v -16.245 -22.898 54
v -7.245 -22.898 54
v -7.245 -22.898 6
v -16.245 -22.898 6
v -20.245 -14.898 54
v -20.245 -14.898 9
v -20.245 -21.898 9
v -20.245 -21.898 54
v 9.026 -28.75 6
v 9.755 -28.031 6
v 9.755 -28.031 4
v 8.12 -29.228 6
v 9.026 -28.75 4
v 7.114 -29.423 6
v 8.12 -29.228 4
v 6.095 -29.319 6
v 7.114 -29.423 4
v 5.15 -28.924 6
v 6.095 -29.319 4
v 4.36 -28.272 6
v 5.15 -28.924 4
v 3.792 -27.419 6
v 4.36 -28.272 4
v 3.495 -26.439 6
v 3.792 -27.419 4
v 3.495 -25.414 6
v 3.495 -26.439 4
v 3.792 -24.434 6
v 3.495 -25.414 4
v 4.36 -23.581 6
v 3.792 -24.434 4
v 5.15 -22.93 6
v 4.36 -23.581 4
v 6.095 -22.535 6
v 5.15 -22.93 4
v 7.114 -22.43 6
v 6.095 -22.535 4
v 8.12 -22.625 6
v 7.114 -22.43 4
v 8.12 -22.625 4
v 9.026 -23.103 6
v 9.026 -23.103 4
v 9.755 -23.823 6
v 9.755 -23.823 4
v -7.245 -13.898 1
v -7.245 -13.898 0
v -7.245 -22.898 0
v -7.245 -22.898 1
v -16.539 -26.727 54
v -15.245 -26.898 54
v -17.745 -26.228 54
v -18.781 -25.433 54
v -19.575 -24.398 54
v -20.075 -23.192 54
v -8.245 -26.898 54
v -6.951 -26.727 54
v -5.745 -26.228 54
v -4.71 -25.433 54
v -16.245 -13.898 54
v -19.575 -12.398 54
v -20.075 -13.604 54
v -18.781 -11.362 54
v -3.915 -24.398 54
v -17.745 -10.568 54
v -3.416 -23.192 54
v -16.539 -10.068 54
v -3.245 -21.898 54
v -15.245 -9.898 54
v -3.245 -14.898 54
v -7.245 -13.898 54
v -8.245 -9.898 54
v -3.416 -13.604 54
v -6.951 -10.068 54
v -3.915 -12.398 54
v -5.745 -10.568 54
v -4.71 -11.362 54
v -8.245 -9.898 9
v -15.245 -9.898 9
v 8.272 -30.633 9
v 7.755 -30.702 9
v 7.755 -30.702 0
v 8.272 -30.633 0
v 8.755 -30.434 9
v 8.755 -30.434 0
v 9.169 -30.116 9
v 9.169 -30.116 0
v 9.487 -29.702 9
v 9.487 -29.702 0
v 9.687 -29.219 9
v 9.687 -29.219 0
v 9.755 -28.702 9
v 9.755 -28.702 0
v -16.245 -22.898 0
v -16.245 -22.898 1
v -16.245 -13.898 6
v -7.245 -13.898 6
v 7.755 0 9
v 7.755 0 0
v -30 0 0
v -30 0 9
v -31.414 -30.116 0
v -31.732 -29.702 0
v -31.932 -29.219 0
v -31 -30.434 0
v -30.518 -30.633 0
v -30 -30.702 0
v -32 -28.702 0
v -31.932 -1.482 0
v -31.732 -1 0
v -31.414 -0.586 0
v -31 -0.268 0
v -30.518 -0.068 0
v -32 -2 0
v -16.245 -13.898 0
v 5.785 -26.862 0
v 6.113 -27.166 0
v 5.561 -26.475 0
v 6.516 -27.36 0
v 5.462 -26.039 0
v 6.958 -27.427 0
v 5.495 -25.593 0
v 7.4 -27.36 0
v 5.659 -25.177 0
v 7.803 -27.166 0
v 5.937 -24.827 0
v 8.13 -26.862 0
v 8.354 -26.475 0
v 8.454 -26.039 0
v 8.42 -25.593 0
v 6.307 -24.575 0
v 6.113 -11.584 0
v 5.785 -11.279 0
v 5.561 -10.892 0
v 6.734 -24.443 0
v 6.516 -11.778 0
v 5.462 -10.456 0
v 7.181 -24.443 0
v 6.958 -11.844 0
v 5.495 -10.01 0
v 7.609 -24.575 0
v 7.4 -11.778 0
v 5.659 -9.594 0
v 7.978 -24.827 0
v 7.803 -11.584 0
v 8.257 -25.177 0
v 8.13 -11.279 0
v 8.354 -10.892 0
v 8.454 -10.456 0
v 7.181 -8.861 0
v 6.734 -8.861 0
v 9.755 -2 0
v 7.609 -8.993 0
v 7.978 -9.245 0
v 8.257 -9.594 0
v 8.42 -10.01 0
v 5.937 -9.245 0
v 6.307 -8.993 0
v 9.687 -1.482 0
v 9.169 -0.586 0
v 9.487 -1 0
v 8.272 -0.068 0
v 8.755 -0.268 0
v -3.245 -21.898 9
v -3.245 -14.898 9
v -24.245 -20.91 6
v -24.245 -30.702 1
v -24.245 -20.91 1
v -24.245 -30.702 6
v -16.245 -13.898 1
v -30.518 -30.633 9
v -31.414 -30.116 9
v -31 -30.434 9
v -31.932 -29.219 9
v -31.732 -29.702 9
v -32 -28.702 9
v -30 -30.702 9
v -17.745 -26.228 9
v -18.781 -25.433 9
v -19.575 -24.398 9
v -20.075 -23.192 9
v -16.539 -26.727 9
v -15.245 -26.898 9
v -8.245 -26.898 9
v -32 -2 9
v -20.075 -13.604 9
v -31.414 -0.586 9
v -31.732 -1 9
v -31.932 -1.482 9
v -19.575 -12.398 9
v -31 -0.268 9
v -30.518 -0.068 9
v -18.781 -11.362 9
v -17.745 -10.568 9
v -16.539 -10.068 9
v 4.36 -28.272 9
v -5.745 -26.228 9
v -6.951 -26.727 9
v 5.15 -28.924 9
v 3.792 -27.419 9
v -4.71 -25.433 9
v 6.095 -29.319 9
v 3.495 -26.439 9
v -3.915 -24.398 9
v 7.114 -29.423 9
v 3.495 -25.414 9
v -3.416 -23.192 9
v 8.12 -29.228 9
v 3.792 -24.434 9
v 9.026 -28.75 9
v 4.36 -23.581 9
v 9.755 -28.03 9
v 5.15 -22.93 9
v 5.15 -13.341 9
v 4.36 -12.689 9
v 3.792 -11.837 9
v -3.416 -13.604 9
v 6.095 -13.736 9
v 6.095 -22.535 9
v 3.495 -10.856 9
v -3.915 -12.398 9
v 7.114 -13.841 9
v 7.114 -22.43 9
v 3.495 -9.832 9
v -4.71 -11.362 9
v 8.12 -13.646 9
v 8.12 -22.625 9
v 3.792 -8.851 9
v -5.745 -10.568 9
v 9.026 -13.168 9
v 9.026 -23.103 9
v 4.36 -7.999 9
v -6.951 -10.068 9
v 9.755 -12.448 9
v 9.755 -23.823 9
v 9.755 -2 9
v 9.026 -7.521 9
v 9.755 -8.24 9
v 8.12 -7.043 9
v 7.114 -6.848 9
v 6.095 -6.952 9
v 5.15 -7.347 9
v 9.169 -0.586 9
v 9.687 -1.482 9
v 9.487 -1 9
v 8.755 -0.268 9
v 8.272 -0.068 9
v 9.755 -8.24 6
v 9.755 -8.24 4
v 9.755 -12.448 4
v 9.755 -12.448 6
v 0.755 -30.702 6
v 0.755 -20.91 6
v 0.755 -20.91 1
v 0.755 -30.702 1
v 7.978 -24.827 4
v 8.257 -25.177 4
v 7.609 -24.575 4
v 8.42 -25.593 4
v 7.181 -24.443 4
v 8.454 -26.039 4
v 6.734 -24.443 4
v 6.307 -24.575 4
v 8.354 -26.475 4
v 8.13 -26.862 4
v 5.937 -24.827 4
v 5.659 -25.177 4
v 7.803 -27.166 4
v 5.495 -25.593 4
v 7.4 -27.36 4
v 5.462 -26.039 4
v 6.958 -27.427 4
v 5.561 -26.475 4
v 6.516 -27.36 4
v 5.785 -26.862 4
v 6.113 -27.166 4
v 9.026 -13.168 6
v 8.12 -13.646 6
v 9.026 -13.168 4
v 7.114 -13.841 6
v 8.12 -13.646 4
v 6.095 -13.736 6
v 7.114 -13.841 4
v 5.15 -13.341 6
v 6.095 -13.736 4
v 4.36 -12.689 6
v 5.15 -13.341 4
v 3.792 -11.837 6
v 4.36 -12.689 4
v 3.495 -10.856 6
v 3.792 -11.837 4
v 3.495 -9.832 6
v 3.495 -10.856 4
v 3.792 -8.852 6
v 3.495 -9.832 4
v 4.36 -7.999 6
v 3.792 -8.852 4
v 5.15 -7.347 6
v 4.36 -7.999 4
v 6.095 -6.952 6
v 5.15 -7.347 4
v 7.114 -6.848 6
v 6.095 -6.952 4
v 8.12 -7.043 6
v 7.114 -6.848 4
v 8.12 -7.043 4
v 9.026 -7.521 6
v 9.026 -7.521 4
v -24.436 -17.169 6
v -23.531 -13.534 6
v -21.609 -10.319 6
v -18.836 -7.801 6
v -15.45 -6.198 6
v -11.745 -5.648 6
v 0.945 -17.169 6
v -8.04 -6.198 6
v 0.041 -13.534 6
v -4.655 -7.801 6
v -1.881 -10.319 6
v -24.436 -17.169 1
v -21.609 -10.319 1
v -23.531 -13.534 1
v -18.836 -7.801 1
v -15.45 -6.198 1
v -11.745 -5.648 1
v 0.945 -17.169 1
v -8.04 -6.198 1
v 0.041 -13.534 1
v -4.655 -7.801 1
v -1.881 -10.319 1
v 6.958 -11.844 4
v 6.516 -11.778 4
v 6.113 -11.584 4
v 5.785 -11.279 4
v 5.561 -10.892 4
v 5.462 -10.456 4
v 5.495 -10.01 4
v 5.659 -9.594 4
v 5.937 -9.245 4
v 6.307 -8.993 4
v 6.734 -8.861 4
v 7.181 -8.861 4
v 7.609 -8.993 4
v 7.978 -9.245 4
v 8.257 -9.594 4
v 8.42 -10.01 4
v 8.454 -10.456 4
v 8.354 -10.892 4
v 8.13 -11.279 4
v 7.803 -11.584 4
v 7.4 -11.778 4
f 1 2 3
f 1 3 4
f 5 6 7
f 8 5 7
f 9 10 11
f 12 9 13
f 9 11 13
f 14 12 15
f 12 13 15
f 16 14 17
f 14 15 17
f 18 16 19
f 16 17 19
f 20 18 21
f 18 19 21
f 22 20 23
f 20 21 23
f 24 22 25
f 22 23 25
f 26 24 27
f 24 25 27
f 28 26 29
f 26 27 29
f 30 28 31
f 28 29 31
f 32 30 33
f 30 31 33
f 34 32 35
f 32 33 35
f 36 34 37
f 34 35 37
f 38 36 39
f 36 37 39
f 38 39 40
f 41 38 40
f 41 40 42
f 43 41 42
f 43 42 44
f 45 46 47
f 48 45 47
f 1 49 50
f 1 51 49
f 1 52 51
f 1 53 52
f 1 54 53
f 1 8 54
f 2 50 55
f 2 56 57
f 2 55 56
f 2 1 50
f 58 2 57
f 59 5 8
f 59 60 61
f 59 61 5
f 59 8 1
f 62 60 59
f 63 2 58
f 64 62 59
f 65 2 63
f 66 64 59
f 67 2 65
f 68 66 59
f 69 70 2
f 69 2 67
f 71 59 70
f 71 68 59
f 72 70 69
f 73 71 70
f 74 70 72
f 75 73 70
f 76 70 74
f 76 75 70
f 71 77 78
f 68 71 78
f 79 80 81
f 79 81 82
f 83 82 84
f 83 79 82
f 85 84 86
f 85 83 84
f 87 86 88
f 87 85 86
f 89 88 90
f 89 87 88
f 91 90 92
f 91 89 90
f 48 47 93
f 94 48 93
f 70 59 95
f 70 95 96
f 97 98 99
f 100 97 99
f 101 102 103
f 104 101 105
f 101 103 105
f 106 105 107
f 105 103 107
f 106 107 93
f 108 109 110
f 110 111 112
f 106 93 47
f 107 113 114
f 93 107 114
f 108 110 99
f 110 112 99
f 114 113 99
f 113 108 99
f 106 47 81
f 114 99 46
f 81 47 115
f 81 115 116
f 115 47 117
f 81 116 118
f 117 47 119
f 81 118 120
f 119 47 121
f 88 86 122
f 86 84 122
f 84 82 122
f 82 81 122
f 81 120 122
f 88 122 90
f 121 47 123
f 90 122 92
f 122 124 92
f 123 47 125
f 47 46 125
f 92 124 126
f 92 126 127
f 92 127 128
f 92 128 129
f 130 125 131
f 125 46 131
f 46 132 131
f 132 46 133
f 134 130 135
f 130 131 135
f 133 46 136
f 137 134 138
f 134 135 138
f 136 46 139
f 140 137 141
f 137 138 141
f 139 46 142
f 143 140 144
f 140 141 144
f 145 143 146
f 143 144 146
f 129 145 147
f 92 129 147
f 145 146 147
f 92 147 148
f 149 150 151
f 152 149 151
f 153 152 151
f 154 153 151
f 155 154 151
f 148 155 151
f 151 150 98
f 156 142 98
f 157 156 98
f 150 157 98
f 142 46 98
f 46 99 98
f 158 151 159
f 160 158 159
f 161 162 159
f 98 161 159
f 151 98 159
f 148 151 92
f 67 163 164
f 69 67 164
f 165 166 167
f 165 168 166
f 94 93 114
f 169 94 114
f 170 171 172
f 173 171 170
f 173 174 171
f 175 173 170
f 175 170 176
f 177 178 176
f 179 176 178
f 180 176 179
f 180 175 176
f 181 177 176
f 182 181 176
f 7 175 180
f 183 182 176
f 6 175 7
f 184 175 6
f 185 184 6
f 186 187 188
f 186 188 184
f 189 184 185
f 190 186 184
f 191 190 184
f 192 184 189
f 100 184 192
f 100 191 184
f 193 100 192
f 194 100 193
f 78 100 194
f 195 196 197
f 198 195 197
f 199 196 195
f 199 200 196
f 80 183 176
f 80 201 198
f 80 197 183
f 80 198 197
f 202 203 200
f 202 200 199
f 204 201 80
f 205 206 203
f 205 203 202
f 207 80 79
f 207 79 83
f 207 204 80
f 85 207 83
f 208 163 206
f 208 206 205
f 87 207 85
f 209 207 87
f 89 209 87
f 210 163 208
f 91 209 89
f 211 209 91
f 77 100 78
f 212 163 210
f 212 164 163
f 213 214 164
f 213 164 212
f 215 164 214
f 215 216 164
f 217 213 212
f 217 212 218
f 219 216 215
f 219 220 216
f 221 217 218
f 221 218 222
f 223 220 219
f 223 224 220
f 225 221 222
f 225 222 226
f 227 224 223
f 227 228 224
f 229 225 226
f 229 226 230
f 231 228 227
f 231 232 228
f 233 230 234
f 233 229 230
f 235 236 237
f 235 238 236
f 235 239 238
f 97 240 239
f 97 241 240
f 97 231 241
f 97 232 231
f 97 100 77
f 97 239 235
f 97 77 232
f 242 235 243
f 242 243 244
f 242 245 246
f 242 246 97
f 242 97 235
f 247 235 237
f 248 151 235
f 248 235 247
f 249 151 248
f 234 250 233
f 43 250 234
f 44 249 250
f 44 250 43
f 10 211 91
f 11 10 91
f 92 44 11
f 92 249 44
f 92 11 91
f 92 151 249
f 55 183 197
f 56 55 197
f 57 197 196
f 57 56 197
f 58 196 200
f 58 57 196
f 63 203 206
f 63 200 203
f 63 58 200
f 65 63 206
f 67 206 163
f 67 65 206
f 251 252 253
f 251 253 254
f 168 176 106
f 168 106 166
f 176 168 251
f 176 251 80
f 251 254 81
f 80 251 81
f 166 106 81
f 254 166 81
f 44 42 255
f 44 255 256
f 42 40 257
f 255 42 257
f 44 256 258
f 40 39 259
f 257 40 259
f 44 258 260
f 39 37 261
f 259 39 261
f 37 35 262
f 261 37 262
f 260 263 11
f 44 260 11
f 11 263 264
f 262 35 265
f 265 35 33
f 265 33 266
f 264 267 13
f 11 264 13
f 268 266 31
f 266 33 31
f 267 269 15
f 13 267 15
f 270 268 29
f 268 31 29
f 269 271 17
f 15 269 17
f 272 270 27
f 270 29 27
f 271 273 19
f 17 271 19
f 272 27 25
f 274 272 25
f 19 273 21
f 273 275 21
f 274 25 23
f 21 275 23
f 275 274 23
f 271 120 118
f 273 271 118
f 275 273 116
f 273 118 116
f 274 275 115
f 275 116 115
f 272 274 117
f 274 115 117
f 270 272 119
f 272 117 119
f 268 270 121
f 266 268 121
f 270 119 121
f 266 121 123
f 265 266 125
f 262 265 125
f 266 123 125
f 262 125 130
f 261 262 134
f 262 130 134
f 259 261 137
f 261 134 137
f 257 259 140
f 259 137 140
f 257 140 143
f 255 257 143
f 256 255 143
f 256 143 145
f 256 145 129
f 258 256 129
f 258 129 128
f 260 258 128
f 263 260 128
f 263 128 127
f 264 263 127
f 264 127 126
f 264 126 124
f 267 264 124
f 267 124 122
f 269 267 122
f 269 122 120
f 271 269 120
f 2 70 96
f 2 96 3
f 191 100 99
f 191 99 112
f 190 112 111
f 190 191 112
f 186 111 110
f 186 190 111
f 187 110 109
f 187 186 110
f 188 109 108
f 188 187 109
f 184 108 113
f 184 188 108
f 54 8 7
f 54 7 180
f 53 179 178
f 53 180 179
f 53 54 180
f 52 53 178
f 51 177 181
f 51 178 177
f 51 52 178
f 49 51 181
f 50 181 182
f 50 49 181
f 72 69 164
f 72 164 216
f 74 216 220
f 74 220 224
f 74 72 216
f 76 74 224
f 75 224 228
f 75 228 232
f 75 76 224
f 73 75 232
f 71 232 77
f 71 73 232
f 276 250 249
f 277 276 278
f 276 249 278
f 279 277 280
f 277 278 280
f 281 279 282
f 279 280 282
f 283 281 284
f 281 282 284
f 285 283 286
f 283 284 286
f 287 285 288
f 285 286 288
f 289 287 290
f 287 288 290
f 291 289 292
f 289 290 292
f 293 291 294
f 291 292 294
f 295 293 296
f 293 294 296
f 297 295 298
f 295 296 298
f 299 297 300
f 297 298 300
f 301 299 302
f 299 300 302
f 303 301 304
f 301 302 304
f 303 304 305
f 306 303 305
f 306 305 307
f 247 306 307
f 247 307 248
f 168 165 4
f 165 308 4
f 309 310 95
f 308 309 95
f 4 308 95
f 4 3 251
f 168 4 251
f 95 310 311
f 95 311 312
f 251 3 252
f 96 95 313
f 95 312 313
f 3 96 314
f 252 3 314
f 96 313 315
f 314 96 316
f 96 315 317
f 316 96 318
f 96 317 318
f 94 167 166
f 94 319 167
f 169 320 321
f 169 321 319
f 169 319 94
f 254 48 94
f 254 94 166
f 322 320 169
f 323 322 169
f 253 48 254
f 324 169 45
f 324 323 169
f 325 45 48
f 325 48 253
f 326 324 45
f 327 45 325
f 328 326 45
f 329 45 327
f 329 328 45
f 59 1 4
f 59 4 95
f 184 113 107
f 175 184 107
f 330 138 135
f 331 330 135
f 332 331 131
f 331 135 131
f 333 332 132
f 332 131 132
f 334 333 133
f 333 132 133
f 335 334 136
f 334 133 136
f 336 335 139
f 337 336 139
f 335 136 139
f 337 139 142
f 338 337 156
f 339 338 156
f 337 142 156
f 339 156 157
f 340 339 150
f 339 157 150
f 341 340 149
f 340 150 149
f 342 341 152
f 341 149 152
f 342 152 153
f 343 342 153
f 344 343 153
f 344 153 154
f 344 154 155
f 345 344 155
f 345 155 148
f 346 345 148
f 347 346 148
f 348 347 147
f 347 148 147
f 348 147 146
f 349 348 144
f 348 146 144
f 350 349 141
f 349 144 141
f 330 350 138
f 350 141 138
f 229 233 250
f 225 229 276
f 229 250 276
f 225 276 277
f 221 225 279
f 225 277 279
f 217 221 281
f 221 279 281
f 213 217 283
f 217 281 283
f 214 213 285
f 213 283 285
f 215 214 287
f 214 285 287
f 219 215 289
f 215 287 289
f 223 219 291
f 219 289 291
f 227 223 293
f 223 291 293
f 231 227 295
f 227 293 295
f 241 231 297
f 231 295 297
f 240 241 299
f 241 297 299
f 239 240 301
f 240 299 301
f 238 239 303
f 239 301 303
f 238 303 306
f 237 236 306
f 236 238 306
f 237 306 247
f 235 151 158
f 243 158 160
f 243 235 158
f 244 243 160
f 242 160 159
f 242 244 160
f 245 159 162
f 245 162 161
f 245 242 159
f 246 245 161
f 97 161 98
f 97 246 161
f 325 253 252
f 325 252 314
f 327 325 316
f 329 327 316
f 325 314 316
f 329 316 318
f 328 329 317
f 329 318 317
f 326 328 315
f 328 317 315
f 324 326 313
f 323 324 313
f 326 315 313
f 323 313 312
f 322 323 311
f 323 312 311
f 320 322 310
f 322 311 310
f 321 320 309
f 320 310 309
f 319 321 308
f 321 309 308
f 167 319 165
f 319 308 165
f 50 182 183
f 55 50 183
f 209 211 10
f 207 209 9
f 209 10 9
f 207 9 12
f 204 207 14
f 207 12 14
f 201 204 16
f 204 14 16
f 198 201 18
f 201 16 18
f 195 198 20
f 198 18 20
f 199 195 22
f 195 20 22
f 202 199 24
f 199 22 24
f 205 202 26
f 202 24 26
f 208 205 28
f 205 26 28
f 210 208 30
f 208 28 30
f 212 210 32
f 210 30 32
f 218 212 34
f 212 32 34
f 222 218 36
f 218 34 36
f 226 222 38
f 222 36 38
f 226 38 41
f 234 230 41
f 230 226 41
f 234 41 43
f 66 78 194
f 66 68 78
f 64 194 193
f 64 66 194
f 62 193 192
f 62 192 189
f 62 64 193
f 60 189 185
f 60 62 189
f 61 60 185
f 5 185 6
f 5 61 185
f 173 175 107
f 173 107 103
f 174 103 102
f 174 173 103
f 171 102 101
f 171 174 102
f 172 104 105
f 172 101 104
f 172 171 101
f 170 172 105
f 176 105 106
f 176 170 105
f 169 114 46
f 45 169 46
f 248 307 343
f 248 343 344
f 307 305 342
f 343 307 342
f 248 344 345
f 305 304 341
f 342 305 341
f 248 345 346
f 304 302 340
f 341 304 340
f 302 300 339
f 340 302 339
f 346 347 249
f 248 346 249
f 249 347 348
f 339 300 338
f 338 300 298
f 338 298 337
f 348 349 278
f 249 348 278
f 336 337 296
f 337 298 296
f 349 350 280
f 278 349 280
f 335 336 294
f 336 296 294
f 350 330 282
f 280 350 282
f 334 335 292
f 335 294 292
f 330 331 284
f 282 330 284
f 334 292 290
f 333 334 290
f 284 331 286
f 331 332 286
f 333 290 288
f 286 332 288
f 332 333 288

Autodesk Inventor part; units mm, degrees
ref_plane "YZ Plane" through (0, 0, 0) normal (1, 0, 0) x (0, 1, 0)
ref_plane "XZ Plane" through (0, 0, 0) normal (0, 1, 0) x (-1, 0, 0)
ref_plane "XY Plane" through (0, 0, 0) normal (0, 0, 1) x (1, 0, 0)
ref_plane "Work Plane1" through (0, 0, 0) normal (0, 0, 1) x (1, 0, 0)
sketch "Sketch1" plane through (0, 0, 0) normal (0, 0, 1) x (1, 0, 0)
  line L0 (9.7547, 0) -> (-32, 0) construction
  line L1 (-32, 0) -> (-32, -5) construction
  line L2 (-5, -5) -> (-32, -5) construction
  line L3 (-5, -30.7015) -> (-5, -5) construction
  line L4 (-0.2453, -30.7015) -> (-5, -30.7015) construction
  line L5 (-0.2453, -30.7015) -> (-0.2453, -31) construction
  line L6 (-0.2453, -31) -> (4.1607, -31) construction
  line L7 (4.1607, -66) -> (4.1607, -31) projected
  line L8 (9.7547, -66) -> (4.1607, -66) projected
  line L9 (9.7547, 0) -> (9.7547, -66) projected
  circle A0 centre (-2.5, -10.3442) radius 1.45 construction
  circle A1 centre (-2.5, -25.9266) radius 1.45 construction
  circle A2 centre (-11.7453, -18.3978) radius 6 construction
  line L10 (-7.2453, -22.8978) -> (-16.2453, -22.8978)
  line L11 (-16.2453, -22.8978) -> (-16.2453, -13.8978)
  line L12 (-16.2453, -13.8978) -> (-7.2453, -13.8978)
  line L13 (-7.2453, -13.8978) -> (-7.2453, -22.8978)
  line L14 (-7.2453, -22.8978) -> (-16.2453, -13.8978)
  line L15 (-16.2453, -22.8978) -> (-7.2453, -13.8978)
  line L16 (9.7547, 0) -> (-32, 0) projected
  line L17 (9.7547, 0) -> (-32, 0) construction
  line L18 (-32, 0) -> (-32, -5) construction
  line L19 (-5, -5) -> (-32, -5) construction
  line L20 (-5, -30.7015) -> (-5, -5) construction
  line L21 (-0.2453, -30.7015) -> (-5, -30.7015) construction
  line L22 (-0.2453, -30.7015) -> (-0.2453, -31) construction
  line L23 (-0.2453, -31) -> (4.1607, -31) construction
  line L24 (4.1607, -66) -> (4.1607, -31) construction
  line L25 (9.7547, -66) -> (4.1607, -66) construction
  line L26 (9.7547, 0) -> (9.7547, -66) construction
  circle A3 centre (-2.5, -10.3442) radius 1.45 construction
  circle A4 centre (-2.5, -25.9266) radius 1.45 construction
  line L27 (9.7547, 0) -> (-32, 0)
  line L28 (-32, 0) -> (-32, -30.7015)
  line L29 (-32, -30.7015) -> (9.7547, -30.7015)
  line L30 (9.7547, -30.7015) -> (9.7547, 0)
  circle A5 centre (-2.5, -25.9266) radius 1.65
  circle A6 centre (-2.5, -10.3442) radius 1.65
  circle A7 centre (6.9577, -25.9266) radius 1.45 projected
  circle A8 centre (6.9577, -10.3442) radius 1.45 projected
  circle A9 centre (6.9577, -25.9266) radius 1.45 projected
  circle A10 centre (6.9577, -10.3442) radius 1.45 projected
  point P0 (0, 0)
  dimension "d0" = 9
  dimension "d1" = 9
  dimension "d2" = 3.3
  dimension "d3" = 3.3
extrude "Extrusion1" add sketch "Sketch1" along normal blind 6 contours L9 L29 L28 L16 | A5 | A6 | A7 | A8
sketch "Sketch2" plane through (0, 0, 6) normal (0, 0, 1) x (1, 0, 0)
  circle A0 centre (-2.5, -25.9266) radius 1.65 projected
  circle A1 centre (-2.5, -10.3442) radius 1.65 projected
  circle A2 centre (6.9577, -25.9266) radius 1.45 projected
  circle A3 centre (6.9577, -10.3442) radius 1.45 projected
  point P0 (0, 0)
hole "Hole1" at (6.9577, -25.9266, 6) at (6.9577, -10.3442, 6) direction (0, 0, -1) diameter 3 end through all counterbore diameter 7 counterbore depth 2
fillet "Fillet1" radius 2 4 edges at (-32, 0, 3) (9.7547, 0, 3) (9.7547, -30.7015, 3) (-32, -30.7015, 3)
sketch "Sketch3" plane through (0, 0, 6) normal (0, 0, 1) x (1, 0, 0)
  line L0 (-16.2453, -22.8978) -> (-16.2453, -13.8978) projected
  line L1 (-7.2453, -13.8978) -> (-7.2453, -22.8978) projected
  line L2 (-7.2453, -22.8978) -> (-16.2453, -22.8978) projected
  circle A0 centre (-11.7453, -18.3978) radius 6 projected
  circle A1 centre (-11.7453, -18.3978) radius 12.75
  line L3 (-24.4953, -18.3978) -> (1.0047, -18.3978)
  line L4 (0.7547, -46.1354) -> (-24.2453, -46.1354)
  line L5 (-24.2453, -46.1354) -> (-24.2453, -20.9102)
  line L6 (-24.2453, -20.9102) -> (0.7547, -20.9102)
  line L7 (0.7547, -20.9102) -> (0.7547, -46.1354)
  line L8 (0.7547, -46.1354) -> (-24.2453, -20.9102) construction
  line L9 (-24.2453, -46.1354) -> (0.7547, -20.9102) construction
  point P0 (0, 0)
  point P1 (-11.7453, -33.5228)
  dimension "d14" = 25.5
  dimension "d17" = 25
extrude "Extrusion2" cut sketch "Sketch3" against normal blind 5
sketch "Sketch4" plane through (0, 0, 6) normal (0, 0, 1) x (1, 0, 0)
  line L0 (0.7547, -20.9102) -> (0.7547, -30.7015) projected
  line L1 (0.7547, -30.7015) -> (7.7547, -30.7015) projected
  arc A0 (7.7547, -30.7015) -> (9.7547, -28.7015) centre (7.7547, -28.7015) ccw projected
  line L2 (9.7547, -28.7015) -> (9.7547, -28.0305) projected
  arc A1 (9.7547, -23.8226) -> (9.7547, -28.0305) centre (6.9577, -25.9266) ccw projected
  line L3 (9.7547, -23.8226) -> (9.7547, -12.4481) projected
  arc A2 (9.7547, -8.2402) -> (9.7547, -12.4481) centre (6.9577, -10.3442) ccw projected
  line L4 (9.7547, -8.2402) -> (9.7547, -2) projected
  arc A3 (9.7547, -2) -> (7.7547, 0) centre (7.7547, -2) ccw projected
  line L5 (7.7547, 0) -> (-30, 0) projected
  arc A4 (-30, 0) -> (-32, -2) centre (-30, -2) ccw projected
  line L6 (-32, -2) -> (-32, -28.7015) projected
  arc A5 (-32, -28.7015) -> (-30, -30.7015) centre (-30, -28.7015) ccw projected
  line L7 (-30, -30.7015) -> (-24.2453, -30.7015) projected
  line L8 (-24.2453, -30.7015) -> (-24.2453, -20.9102) projected
  arc A6 (0.7547, -20.9102) -> (-24.2453, -20.9102) centre (-11.7453, -18.3978) ccw projected
  line L9 (0.7547, -30.7015) -> (7.7547, -30.7015) projected
  line L10 (-24.2453, -30.7015) -> (0.7547, -30.7015)
  line L11 (-16.2453, -13.8978) -> (-16.2453, -22.8978) projected
  line L12 (-16.2453, -22.8978) -> (-7.2453, -22.8978) projected
  line L13 (-7.2453, -13.8978) -> (-16.2453, -13.8978) projected
  line L14 (-7.2453, -22.8978) -> (-7.2453, -13.8978) projected
  point P0 (0, 0)
extrude "Extrusion3" add sketch "Sketch4" along normal blind 3
sketch "Sketch5" plane through (0, 0, 9) normal (0, 0, 1) x (1, 0, 0)
  line L0 (-16.2453, -22.8978) -> (-16.2453, -13.8978) projected
  line L1 (-7.2453, -13.8978) -> (-7.2453, -22.8978) projected
  line L2 (-7.2453, -22.8978) -> (-16.2453, -22.8978) projected
  line L3 (-16.2453, -13.8978) -> (-7.2453, -13.8978) projected
  line L4 (-7.2453, -13.8978) -> (-7.2453, -22.8978) projected
  line L5 (-7.2453, -22.8978) -> (-16.2453, -22.8978) projected
  line L6 (-16.2453, -22.8978) -> (-16.2453, -13.8978) projected
  line L7 (-30, -30.7015) -> (7.7547, -30.7015) projected
  arc A0 (7.7547, -30.7015) -> (9.7547, -28.7015) centre (7.7547, -28.7015) ccw projected
  line L8 (9.7547, -28.7015) -> (9.7547, -28.0305) projected
  arc A1 (9.7547, -23.8226) -> (9.7547, -28.0305) centre (6.9577, -25.9266) ccw projected
  line L9 (9.7547, -23.8226) -> (9.7547, -12.4481) projected
  arc A2 (9.7547, -8.2402) -> (9.7547, -12.4481) centre (6.9577, -10.3442) ccw projected
  line L10 (9.7547, -8.2402) -> (9.7547, -2) projected
  arc A3 (9.7547, -2) -> (7.7547, 0) centre (7.7547, -2) ccw projected
  line L11 (7.7547, 0) -> (-30, 0) projected
  arc A4 (-30, 0) -> (-32, -2) centre (-30, -2) ccw projected
  line L12 (-32, -2) -> (-32, -28.7015) projected
  arc A5 (-32, -28.7015) -> (-30, -30.7015) centre (-30, -28.7015) ccw projected
  line L13 (-3.2453, -9.8978) -> (-20.2453, -9.8978)
  line L14 (-20.2453, -9.8978) -> (-20.2453, -26.8978)
  line L15 (-20.2453, -26.8978) -> (-3.2453, -26.8978)
  line L16 (-3.2453, -26.8978) -> (-3.2453, -9.8978)
  point P0 (0, 0)
  dimension "d20" = 4
extrude "Extrusion4" add sketch "Sketch5" along normal blind 45 contours L16 L15 L14 L13
fillet "Fillet2" radius 5 4 edges at (-3.2453, -26.8978, 31.5) (-20.2453, -26.8978, 31.5) (-3.2453, -9.8978, 31.5) (-20.2453, -9.8978, 31.5)
properties part number "30_cellSTORM_laserbase_ESP32cameradapter_v3"
